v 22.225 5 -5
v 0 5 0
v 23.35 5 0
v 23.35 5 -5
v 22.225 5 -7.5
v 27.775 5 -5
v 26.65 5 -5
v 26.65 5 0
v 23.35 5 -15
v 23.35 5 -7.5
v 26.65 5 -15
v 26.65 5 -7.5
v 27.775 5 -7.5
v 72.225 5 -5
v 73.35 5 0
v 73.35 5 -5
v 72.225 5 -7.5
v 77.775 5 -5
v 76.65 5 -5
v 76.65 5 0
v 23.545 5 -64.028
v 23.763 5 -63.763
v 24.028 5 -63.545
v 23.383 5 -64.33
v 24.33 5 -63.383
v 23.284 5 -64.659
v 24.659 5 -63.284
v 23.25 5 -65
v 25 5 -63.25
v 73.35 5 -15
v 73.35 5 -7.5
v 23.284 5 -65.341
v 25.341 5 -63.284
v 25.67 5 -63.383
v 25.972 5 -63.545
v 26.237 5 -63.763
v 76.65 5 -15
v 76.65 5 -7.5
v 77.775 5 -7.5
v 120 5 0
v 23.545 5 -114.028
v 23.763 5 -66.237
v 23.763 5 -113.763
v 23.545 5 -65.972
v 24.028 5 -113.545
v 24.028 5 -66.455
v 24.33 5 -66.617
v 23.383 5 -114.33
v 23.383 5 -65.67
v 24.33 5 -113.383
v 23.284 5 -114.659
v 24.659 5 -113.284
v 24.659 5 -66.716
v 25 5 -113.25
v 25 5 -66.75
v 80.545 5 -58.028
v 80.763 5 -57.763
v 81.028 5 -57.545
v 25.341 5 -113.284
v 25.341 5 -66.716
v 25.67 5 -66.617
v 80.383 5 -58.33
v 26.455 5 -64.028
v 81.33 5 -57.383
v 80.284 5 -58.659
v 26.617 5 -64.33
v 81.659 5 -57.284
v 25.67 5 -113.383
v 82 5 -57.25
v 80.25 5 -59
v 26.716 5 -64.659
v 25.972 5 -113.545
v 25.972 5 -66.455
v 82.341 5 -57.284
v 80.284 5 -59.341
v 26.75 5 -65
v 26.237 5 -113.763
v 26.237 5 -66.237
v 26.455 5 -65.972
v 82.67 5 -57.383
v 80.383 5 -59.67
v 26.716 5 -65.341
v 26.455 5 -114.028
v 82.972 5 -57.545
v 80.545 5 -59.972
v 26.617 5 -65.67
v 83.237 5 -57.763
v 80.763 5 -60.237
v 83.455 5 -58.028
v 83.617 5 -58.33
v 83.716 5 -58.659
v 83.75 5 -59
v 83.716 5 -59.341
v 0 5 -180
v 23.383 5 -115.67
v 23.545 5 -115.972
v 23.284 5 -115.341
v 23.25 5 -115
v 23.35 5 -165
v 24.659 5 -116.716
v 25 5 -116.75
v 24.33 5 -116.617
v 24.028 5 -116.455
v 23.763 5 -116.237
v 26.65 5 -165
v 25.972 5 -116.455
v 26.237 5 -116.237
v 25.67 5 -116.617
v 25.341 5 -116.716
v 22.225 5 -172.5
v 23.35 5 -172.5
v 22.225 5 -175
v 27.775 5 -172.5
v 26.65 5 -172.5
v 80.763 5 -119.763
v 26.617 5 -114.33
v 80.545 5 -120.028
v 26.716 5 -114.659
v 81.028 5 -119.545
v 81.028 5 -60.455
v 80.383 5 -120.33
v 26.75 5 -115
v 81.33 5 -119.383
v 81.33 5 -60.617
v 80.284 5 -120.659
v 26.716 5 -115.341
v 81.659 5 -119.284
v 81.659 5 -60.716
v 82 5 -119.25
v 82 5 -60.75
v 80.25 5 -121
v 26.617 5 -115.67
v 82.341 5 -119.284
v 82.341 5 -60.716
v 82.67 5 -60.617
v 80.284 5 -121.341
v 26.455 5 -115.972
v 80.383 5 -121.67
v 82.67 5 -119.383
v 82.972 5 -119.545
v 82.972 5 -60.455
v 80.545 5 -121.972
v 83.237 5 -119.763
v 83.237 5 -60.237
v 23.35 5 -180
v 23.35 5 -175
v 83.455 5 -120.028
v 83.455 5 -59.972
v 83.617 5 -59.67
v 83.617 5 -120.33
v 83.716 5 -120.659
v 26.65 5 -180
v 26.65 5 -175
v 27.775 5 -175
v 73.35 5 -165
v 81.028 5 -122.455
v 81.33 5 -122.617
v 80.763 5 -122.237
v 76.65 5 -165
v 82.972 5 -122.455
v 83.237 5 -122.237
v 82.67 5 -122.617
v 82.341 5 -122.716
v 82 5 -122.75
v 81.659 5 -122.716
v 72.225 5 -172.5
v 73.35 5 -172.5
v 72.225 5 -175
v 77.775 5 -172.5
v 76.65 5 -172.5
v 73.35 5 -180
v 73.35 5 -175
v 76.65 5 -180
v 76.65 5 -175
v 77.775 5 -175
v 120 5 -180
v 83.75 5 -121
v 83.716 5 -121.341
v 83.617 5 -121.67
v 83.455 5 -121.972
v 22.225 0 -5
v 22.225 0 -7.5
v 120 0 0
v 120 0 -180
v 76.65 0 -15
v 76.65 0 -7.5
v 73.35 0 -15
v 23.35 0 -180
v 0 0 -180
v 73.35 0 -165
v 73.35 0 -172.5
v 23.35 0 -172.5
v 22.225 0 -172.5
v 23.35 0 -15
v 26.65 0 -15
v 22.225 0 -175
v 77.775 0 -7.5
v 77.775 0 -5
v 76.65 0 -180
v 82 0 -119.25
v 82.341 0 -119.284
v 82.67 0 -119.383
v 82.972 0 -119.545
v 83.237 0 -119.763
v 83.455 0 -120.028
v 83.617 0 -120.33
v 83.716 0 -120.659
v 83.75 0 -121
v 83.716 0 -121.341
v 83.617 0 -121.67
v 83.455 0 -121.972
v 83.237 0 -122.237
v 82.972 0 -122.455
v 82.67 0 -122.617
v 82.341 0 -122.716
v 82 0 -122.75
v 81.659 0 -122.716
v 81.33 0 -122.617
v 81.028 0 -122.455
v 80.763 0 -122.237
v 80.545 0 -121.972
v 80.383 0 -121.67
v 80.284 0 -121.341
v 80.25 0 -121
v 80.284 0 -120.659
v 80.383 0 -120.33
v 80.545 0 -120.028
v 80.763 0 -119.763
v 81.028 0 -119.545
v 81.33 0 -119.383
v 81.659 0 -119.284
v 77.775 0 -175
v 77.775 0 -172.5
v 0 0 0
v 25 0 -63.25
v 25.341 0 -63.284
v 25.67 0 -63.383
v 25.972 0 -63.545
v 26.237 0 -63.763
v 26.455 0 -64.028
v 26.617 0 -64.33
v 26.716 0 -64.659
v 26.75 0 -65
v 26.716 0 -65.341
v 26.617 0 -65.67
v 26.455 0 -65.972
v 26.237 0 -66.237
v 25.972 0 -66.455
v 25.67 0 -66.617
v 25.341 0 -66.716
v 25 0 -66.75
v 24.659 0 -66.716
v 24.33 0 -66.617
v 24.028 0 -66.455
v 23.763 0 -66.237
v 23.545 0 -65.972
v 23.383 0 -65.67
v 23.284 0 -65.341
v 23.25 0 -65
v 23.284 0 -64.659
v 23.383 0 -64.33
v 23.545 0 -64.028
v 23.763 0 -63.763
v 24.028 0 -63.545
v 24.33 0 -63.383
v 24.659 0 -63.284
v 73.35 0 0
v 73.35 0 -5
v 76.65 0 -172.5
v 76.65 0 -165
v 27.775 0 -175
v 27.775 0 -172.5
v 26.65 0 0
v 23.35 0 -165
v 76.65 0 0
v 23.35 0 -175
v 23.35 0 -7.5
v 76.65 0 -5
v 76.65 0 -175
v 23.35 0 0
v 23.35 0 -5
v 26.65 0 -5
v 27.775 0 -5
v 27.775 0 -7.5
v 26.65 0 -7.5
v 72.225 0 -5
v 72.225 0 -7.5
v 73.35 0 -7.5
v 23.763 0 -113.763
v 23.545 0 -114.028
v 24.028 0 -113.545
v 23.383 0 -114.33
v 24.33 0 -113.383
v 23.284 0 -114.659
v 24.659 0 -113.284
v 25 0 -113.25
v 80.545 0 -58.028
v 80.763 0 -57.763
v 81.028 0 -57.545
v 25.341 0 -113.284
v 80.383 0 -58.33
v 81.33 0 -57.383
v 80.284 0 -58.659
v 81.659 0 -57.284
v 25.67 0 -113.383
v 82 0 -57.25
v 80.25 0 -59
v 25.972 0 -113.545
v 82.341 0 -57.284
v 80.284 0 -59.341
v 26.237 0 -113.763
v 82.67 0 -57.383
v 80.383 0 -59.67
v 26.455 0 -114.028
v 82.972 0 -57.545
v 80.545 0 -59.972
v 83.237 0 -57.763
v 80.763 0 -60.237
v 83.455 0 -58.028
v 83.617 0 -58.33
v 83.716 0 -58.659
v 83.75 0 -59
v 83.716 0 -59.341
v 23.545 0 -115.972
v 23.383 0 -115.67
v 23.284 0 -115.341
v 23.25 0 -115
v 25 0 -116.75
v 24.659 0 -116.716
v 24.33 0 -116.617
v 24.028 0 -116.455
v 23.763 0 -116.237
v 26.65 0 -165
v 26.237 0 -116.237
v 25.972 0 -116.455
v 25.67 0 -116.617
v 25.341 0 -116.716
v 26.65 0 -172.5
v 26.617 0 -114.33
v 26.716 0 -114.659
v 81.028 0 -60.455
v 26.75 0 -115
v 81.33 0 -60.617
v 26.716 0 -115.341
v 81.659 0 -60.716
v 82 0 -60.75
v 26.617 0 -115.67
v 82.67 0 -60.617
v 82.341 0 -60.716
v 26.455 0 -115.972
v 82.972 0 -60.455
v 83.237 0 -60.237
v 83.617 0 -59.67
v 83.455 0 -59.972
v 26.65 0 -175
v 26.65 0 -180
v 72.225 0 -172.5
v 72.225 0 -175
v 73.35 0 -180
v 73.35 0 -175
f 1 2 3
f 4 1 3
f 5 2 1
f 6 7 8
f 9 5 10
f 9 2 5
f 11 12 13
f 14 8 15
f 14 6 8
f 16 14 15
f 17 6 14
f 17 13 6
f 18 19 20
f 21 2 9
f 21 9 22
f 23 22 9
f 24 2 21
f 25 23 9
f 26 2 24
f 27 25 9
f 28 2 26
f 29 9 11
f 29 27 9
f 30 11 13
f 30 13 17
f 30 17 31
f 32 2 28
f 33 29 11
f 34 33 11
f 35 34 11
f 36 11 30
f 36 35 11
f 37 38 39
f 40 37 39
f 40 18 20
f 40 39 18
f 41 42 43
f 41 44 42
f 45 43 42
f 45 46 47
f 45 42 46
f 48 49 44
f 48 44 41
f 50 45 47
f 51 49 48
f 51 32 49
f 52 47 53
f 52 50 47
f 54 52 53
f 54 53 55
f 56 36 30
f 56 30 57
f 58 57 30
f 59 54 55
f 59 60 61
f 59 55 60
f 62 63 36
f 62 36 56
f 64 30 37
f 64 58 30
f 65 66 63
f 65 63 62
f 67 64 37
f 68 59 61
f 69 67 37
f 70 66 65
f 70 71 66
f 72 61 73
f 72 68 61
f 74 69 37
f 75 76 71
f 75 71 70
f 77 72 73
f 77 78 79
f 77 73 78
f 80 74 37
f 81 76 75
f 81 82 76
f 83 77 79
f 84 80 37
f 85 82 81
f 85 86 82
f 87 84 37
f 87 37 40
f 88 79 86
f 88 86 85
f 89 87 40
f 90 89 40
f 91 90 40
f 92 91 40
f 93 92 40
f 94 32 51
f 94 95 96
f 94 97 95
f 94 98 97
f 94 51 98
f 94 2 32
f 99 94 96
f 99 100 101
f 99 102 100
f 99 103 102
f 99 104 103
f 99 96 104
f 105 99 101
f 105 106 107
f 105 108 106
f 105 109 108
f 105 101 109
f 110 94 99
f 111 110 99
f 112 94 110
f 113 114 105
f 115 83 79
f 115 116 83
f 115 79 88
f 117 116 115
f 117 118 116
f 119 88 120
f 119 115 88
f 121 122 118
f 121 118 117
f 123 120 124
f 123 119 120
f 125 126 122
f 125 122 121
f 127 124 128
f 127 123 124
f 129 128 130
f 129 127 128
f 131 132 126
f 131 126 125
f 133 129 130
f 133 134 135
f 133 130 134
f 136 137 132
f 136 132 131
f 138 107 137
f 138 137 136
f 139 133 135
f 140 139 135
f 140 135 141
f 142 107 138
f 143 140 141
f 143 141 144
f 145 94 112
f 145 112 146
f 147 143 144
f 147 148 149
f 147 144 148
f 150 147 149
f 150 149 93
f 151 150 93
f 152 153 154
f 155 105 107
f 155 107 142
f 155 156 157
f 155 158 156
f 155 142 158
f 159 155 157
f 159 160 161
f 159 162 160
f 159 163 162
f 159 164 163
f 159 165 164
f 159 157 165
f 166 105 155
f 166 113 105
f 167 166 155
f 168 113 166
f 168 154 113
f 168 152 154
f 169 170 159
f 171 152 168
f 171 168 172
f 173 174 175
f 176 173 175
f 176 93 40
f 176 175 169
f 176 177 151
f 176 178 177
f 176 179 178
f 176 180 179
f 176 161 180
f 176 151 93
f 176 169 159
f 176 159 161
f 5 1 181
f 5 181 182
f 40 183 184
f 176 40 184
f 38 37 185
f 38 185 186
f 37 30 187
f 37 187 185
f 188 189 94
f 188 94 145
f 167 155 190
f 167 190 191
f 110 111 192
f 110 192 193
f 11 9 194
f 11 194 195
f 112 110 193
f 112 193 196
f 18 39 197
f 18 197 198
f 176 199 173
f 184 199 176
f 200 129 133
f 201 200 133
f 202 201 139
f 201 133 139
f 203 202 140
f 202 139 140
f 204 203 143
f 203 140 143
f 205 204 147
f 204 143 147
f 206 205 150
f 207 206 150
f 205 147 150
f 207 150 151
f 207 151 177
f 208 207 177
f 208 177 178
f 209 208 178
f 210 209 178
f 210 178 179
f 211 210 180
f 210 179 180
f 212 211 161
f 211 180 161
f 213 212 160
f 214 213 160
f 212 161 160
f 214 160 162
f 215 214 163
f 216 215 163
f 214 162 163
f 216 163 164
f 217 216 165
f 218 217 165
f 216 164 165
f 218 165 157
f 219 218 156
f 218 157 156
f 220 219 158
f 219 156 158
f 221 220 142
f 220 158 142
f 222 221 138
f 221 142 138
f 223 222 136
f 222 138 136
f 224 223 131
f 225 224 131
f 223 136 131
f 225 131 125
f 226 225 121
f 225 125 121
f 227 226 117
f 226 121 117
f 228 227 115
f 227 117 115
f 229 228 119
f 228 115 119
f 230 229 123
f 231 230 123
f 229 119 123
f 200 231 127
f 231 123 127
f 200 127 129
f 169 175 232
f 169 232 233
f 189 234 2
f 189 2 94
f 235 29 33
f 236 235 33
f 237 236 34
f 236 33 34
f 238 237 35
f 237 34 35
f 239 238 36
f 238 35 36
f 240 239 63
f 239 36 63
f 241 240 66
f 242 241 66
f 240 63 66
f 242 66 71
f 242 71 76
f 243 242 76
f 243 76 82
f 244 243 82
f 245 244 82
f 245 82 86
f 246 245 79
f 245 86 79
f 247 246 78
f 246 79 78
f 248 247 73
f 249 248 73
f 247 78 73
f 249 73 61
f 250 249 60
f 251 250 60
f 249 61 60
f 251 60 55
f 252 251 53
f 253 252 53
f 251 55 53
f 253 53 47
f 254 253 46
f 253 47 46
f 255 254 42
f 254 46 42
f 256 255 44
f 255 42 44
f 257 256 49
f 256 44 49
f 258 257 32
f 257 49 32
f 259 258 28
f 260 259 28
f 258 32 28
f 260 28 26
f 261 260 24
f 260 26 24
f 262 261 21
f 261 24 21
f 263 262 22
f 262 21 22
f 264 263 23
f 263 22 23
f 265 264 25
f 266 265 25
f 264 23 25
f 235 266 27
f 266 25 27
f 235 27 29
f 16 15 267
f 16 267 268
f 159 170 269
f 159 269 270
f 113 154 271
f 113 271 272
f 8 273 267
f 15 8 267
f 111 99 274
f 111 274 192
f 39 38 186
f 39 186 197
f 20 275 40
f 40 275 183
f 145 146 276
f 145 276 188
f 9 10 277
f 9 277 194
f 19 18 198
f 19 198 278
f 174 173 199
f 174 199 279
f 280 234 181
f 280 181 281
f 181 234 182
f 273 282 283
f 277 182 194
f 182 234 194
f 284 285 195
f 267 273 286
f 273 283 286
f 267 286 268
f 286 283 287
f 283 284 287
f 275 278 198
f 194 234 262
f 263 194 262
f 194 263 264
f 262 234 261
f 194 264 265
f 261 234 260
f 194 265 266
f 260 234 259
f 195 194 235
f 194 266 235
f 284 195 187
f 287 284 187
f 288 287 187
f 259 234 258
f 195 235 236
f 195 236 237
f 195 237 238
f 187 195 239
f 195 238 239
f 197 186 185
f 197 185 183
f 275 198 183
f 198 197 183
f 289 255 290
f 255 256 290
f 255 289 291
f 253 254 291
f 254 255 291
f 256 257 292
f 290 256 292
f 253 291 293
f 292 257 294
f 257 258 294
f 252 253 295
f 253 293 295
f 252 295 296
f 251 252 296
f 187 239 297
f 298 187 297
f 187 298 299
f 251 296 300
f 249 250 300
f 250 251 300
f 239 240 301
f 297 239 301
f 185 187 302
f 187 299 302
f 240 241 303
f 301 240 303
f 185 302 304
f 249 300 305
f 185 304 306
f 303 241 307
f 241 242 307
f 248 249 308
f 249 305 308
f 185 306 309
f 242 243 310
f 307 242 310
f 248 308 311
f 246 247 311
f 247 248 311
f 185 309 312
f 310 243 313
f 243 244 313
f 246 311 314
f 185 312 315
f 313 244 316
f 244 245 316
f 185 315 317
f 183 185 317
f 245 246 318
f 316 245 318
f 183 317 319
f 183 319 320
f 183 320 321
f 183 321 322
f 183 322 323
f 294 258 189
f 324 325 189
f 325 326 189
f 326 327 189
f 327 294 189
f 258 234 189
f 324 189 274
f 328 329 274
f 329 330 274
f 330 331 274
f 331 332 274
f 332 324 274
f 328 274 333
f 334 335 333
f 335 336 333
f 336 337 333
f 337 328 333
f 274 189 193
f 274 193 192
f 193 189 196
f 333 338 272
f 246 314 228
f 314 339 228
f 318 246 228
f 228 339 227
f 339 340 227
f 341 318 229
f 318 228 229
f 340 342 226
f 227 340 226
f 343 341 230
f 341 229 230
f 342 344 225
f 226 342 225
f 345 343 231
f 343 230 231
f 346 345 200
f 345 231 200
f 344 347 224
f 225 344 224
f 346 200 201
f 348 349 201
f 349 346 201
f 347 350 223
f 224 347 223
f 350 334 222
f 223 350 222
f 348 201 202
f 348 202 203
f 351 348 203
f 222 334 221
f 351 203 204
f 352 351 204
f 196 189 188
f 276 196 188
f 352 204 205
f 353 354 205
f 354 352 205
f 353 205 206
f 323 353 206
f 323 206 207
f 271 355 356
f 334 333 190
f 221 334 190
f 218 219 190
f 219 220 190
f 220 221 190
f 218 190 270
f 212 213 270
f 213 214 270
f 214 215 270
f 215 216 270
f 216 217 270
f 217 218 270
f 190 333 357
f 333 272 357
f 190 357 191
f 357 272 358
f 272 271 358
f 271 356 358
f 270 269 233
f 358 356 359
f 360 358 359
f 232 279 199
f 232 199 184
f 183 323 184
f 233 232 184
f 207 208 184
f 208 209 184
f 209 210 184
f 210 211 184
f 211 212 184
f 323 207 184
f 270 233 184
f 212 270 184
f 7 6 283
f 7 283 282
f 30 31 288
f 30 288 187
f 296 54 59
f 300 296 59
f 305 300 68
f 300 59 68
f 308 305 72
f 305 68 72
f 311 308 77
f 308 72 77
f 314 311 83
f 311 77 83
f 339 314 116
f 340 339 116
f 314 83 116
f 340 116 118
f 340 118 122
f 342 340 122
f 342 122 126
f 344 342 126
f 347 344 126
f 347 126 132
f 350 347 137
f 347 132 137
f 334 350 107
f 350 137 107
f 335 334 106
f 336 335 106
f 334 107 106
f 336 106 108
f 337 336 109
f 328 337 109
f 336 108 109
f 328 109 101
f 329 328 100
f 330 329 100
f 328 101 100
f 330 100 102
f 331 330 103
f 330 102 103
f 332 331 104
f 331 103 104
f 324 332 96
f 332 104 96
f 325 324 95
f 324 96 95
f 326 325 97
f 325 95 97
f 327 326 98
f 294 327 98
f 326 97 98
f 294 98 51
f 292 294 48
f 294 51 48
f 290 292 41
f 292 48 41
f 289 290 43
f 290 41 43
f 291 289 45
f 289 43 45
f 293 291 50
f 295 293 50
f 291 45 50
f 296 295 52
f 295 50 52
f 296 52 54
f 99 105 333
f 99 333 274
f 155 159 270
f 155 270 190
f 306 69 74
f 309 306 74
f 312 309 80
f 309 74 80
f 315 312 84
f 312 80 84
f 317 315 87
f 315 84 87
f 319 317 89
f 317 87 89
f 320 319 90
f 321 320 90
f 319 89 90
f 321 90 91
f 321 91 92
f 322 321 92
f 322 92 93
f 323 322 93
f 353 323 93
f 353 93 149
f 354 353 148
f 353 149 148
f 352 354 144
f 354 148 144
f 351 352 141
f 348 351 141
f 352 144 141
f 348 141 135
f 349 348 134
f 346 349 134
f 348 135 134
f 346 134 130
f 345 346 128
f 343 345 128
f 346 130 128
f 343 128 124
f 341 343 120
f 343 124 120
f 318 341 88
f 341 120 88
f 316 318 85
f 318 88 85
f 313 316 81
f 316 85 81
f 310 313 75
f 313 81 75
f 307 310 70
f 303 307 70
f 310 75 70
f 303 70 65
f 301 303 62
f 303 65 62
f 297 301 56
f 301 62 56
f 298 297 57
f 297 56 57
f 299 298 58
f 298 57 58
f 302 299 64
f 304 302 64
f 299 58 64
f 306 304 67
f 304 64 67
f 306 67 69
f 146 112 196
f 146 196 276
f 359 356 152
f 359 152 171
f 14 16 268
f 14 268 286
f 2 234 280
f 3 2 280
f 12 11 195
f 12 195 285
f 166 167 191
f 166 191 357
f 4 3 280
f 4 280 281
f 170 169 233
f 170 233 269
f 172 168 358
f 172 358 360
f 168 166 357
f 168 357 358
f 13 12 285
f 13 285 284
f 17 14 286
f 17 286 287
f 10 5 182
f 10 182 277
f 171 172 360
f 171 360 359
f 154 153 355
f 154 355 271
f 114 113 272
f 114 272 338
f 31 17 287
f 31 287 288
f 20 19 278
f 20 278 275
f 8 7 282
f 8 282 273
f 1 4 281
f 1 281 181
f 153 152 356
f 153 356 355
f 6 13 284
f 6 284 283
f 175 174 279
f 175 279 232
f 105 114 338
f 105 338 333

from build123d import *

# Parameters (mm, degrees)
SKETCH1_W           = 120
SKETCH1_H           = 180
BOSS_EXTRUDE1_DEPTH = 5
CUT_EXTRUDE1_DEPTH  = 5
SKETCH3_R           = 1.75
CUT_EXTRUDE2_DEPTH  = 5


with BuildPart() as part:
    # Sketch1 → Boss-Extrude1 (new body)
    with BuildSketch(Plane(origin=(0, 0, 0), x_dir=(1, 0, 0), z_dir=(0, 1, 0))):
        with Locations((60, 90)):
            Rectangle(SKETCH1_W, SKETCH1_H)
    extrude(amount=BOSS_EXTRUDE1_DEPTH)

    # Sketch2 → Cut-Extrude1 (cut)
    with BuildSketch(Plane(origin=(0, 5, 0), x_dir=(1, 0, 0), z_dir=(0, 1, 0))):
        Polygon((23.35, 15), (26.65, 15), (26.65, 7.5), (27.775, 7.5), (27.775, 5), (26.65, 5), (26.65, 0), (23.35, 0), (23.35, 5), (22.225, 5), (22.225, 7.5), (23.35, 7.5), align=None)
        Polygon((76.65, 15), (76.65, 7.5), (77.775, 7.5), (77.775, 5), (76.65, 5), (76.65, 0), (73.35, 0), (73.35, 5), (72.225, 5), (72.225, 7.5), (73.35, 7.5), (73.35, 15), align=None)
        Polygon((76.65, 165), (73.35, 165), (73.35, 172.5), (72.225, 172.5), (72.225, 175), (73.35, 175), (73.35, 180), (76.65, 180), (76.65, 175), (77.775, 175), (77.775, 172.5), (76.65, 172.5), align=None)
        Polygon((23.35, 165), (23.35, 172.5), (22.225, 172.5), (22.225, 175), (23.35, 175), (23.35, 180), (26.65, 180), (26.65, 175), (27.775, 175), (27.775, 172.5), (26.65, 172.5), (26.65, 165), align=None)
    extrude(amount=-CUT_EXTRUDE1_DEPTH, mode=Mode.SUBTRACT)

    # Sketch3 → Cut-Extrude2 (cut)
    with BuildSketch(Plane(origin=(0, 5, 0), x_dir=(1, 0, 0), z_dir=(0, 1, 0))):
        with Locations(Location((25, 65, 0), (0, 0, 270))):
            Circle(SKETCH3_R)
        with Locations(Location((82, 59, 0), (0, 0, 270))):
            Circle(SKETCH3_R)
        with Locations(Location((25, 115, 0), (0, 0, 270))):
            Circle(SKETCH3_R)
        with Locations(Location((82, 121, 0), (0, 0, 270))):
            Circle(SKETCH3_R)
    extrude(amount=-CUT_EXTRUDE2_DEPTH, mode=Mode.SUBTRACT)


solid = part.part
